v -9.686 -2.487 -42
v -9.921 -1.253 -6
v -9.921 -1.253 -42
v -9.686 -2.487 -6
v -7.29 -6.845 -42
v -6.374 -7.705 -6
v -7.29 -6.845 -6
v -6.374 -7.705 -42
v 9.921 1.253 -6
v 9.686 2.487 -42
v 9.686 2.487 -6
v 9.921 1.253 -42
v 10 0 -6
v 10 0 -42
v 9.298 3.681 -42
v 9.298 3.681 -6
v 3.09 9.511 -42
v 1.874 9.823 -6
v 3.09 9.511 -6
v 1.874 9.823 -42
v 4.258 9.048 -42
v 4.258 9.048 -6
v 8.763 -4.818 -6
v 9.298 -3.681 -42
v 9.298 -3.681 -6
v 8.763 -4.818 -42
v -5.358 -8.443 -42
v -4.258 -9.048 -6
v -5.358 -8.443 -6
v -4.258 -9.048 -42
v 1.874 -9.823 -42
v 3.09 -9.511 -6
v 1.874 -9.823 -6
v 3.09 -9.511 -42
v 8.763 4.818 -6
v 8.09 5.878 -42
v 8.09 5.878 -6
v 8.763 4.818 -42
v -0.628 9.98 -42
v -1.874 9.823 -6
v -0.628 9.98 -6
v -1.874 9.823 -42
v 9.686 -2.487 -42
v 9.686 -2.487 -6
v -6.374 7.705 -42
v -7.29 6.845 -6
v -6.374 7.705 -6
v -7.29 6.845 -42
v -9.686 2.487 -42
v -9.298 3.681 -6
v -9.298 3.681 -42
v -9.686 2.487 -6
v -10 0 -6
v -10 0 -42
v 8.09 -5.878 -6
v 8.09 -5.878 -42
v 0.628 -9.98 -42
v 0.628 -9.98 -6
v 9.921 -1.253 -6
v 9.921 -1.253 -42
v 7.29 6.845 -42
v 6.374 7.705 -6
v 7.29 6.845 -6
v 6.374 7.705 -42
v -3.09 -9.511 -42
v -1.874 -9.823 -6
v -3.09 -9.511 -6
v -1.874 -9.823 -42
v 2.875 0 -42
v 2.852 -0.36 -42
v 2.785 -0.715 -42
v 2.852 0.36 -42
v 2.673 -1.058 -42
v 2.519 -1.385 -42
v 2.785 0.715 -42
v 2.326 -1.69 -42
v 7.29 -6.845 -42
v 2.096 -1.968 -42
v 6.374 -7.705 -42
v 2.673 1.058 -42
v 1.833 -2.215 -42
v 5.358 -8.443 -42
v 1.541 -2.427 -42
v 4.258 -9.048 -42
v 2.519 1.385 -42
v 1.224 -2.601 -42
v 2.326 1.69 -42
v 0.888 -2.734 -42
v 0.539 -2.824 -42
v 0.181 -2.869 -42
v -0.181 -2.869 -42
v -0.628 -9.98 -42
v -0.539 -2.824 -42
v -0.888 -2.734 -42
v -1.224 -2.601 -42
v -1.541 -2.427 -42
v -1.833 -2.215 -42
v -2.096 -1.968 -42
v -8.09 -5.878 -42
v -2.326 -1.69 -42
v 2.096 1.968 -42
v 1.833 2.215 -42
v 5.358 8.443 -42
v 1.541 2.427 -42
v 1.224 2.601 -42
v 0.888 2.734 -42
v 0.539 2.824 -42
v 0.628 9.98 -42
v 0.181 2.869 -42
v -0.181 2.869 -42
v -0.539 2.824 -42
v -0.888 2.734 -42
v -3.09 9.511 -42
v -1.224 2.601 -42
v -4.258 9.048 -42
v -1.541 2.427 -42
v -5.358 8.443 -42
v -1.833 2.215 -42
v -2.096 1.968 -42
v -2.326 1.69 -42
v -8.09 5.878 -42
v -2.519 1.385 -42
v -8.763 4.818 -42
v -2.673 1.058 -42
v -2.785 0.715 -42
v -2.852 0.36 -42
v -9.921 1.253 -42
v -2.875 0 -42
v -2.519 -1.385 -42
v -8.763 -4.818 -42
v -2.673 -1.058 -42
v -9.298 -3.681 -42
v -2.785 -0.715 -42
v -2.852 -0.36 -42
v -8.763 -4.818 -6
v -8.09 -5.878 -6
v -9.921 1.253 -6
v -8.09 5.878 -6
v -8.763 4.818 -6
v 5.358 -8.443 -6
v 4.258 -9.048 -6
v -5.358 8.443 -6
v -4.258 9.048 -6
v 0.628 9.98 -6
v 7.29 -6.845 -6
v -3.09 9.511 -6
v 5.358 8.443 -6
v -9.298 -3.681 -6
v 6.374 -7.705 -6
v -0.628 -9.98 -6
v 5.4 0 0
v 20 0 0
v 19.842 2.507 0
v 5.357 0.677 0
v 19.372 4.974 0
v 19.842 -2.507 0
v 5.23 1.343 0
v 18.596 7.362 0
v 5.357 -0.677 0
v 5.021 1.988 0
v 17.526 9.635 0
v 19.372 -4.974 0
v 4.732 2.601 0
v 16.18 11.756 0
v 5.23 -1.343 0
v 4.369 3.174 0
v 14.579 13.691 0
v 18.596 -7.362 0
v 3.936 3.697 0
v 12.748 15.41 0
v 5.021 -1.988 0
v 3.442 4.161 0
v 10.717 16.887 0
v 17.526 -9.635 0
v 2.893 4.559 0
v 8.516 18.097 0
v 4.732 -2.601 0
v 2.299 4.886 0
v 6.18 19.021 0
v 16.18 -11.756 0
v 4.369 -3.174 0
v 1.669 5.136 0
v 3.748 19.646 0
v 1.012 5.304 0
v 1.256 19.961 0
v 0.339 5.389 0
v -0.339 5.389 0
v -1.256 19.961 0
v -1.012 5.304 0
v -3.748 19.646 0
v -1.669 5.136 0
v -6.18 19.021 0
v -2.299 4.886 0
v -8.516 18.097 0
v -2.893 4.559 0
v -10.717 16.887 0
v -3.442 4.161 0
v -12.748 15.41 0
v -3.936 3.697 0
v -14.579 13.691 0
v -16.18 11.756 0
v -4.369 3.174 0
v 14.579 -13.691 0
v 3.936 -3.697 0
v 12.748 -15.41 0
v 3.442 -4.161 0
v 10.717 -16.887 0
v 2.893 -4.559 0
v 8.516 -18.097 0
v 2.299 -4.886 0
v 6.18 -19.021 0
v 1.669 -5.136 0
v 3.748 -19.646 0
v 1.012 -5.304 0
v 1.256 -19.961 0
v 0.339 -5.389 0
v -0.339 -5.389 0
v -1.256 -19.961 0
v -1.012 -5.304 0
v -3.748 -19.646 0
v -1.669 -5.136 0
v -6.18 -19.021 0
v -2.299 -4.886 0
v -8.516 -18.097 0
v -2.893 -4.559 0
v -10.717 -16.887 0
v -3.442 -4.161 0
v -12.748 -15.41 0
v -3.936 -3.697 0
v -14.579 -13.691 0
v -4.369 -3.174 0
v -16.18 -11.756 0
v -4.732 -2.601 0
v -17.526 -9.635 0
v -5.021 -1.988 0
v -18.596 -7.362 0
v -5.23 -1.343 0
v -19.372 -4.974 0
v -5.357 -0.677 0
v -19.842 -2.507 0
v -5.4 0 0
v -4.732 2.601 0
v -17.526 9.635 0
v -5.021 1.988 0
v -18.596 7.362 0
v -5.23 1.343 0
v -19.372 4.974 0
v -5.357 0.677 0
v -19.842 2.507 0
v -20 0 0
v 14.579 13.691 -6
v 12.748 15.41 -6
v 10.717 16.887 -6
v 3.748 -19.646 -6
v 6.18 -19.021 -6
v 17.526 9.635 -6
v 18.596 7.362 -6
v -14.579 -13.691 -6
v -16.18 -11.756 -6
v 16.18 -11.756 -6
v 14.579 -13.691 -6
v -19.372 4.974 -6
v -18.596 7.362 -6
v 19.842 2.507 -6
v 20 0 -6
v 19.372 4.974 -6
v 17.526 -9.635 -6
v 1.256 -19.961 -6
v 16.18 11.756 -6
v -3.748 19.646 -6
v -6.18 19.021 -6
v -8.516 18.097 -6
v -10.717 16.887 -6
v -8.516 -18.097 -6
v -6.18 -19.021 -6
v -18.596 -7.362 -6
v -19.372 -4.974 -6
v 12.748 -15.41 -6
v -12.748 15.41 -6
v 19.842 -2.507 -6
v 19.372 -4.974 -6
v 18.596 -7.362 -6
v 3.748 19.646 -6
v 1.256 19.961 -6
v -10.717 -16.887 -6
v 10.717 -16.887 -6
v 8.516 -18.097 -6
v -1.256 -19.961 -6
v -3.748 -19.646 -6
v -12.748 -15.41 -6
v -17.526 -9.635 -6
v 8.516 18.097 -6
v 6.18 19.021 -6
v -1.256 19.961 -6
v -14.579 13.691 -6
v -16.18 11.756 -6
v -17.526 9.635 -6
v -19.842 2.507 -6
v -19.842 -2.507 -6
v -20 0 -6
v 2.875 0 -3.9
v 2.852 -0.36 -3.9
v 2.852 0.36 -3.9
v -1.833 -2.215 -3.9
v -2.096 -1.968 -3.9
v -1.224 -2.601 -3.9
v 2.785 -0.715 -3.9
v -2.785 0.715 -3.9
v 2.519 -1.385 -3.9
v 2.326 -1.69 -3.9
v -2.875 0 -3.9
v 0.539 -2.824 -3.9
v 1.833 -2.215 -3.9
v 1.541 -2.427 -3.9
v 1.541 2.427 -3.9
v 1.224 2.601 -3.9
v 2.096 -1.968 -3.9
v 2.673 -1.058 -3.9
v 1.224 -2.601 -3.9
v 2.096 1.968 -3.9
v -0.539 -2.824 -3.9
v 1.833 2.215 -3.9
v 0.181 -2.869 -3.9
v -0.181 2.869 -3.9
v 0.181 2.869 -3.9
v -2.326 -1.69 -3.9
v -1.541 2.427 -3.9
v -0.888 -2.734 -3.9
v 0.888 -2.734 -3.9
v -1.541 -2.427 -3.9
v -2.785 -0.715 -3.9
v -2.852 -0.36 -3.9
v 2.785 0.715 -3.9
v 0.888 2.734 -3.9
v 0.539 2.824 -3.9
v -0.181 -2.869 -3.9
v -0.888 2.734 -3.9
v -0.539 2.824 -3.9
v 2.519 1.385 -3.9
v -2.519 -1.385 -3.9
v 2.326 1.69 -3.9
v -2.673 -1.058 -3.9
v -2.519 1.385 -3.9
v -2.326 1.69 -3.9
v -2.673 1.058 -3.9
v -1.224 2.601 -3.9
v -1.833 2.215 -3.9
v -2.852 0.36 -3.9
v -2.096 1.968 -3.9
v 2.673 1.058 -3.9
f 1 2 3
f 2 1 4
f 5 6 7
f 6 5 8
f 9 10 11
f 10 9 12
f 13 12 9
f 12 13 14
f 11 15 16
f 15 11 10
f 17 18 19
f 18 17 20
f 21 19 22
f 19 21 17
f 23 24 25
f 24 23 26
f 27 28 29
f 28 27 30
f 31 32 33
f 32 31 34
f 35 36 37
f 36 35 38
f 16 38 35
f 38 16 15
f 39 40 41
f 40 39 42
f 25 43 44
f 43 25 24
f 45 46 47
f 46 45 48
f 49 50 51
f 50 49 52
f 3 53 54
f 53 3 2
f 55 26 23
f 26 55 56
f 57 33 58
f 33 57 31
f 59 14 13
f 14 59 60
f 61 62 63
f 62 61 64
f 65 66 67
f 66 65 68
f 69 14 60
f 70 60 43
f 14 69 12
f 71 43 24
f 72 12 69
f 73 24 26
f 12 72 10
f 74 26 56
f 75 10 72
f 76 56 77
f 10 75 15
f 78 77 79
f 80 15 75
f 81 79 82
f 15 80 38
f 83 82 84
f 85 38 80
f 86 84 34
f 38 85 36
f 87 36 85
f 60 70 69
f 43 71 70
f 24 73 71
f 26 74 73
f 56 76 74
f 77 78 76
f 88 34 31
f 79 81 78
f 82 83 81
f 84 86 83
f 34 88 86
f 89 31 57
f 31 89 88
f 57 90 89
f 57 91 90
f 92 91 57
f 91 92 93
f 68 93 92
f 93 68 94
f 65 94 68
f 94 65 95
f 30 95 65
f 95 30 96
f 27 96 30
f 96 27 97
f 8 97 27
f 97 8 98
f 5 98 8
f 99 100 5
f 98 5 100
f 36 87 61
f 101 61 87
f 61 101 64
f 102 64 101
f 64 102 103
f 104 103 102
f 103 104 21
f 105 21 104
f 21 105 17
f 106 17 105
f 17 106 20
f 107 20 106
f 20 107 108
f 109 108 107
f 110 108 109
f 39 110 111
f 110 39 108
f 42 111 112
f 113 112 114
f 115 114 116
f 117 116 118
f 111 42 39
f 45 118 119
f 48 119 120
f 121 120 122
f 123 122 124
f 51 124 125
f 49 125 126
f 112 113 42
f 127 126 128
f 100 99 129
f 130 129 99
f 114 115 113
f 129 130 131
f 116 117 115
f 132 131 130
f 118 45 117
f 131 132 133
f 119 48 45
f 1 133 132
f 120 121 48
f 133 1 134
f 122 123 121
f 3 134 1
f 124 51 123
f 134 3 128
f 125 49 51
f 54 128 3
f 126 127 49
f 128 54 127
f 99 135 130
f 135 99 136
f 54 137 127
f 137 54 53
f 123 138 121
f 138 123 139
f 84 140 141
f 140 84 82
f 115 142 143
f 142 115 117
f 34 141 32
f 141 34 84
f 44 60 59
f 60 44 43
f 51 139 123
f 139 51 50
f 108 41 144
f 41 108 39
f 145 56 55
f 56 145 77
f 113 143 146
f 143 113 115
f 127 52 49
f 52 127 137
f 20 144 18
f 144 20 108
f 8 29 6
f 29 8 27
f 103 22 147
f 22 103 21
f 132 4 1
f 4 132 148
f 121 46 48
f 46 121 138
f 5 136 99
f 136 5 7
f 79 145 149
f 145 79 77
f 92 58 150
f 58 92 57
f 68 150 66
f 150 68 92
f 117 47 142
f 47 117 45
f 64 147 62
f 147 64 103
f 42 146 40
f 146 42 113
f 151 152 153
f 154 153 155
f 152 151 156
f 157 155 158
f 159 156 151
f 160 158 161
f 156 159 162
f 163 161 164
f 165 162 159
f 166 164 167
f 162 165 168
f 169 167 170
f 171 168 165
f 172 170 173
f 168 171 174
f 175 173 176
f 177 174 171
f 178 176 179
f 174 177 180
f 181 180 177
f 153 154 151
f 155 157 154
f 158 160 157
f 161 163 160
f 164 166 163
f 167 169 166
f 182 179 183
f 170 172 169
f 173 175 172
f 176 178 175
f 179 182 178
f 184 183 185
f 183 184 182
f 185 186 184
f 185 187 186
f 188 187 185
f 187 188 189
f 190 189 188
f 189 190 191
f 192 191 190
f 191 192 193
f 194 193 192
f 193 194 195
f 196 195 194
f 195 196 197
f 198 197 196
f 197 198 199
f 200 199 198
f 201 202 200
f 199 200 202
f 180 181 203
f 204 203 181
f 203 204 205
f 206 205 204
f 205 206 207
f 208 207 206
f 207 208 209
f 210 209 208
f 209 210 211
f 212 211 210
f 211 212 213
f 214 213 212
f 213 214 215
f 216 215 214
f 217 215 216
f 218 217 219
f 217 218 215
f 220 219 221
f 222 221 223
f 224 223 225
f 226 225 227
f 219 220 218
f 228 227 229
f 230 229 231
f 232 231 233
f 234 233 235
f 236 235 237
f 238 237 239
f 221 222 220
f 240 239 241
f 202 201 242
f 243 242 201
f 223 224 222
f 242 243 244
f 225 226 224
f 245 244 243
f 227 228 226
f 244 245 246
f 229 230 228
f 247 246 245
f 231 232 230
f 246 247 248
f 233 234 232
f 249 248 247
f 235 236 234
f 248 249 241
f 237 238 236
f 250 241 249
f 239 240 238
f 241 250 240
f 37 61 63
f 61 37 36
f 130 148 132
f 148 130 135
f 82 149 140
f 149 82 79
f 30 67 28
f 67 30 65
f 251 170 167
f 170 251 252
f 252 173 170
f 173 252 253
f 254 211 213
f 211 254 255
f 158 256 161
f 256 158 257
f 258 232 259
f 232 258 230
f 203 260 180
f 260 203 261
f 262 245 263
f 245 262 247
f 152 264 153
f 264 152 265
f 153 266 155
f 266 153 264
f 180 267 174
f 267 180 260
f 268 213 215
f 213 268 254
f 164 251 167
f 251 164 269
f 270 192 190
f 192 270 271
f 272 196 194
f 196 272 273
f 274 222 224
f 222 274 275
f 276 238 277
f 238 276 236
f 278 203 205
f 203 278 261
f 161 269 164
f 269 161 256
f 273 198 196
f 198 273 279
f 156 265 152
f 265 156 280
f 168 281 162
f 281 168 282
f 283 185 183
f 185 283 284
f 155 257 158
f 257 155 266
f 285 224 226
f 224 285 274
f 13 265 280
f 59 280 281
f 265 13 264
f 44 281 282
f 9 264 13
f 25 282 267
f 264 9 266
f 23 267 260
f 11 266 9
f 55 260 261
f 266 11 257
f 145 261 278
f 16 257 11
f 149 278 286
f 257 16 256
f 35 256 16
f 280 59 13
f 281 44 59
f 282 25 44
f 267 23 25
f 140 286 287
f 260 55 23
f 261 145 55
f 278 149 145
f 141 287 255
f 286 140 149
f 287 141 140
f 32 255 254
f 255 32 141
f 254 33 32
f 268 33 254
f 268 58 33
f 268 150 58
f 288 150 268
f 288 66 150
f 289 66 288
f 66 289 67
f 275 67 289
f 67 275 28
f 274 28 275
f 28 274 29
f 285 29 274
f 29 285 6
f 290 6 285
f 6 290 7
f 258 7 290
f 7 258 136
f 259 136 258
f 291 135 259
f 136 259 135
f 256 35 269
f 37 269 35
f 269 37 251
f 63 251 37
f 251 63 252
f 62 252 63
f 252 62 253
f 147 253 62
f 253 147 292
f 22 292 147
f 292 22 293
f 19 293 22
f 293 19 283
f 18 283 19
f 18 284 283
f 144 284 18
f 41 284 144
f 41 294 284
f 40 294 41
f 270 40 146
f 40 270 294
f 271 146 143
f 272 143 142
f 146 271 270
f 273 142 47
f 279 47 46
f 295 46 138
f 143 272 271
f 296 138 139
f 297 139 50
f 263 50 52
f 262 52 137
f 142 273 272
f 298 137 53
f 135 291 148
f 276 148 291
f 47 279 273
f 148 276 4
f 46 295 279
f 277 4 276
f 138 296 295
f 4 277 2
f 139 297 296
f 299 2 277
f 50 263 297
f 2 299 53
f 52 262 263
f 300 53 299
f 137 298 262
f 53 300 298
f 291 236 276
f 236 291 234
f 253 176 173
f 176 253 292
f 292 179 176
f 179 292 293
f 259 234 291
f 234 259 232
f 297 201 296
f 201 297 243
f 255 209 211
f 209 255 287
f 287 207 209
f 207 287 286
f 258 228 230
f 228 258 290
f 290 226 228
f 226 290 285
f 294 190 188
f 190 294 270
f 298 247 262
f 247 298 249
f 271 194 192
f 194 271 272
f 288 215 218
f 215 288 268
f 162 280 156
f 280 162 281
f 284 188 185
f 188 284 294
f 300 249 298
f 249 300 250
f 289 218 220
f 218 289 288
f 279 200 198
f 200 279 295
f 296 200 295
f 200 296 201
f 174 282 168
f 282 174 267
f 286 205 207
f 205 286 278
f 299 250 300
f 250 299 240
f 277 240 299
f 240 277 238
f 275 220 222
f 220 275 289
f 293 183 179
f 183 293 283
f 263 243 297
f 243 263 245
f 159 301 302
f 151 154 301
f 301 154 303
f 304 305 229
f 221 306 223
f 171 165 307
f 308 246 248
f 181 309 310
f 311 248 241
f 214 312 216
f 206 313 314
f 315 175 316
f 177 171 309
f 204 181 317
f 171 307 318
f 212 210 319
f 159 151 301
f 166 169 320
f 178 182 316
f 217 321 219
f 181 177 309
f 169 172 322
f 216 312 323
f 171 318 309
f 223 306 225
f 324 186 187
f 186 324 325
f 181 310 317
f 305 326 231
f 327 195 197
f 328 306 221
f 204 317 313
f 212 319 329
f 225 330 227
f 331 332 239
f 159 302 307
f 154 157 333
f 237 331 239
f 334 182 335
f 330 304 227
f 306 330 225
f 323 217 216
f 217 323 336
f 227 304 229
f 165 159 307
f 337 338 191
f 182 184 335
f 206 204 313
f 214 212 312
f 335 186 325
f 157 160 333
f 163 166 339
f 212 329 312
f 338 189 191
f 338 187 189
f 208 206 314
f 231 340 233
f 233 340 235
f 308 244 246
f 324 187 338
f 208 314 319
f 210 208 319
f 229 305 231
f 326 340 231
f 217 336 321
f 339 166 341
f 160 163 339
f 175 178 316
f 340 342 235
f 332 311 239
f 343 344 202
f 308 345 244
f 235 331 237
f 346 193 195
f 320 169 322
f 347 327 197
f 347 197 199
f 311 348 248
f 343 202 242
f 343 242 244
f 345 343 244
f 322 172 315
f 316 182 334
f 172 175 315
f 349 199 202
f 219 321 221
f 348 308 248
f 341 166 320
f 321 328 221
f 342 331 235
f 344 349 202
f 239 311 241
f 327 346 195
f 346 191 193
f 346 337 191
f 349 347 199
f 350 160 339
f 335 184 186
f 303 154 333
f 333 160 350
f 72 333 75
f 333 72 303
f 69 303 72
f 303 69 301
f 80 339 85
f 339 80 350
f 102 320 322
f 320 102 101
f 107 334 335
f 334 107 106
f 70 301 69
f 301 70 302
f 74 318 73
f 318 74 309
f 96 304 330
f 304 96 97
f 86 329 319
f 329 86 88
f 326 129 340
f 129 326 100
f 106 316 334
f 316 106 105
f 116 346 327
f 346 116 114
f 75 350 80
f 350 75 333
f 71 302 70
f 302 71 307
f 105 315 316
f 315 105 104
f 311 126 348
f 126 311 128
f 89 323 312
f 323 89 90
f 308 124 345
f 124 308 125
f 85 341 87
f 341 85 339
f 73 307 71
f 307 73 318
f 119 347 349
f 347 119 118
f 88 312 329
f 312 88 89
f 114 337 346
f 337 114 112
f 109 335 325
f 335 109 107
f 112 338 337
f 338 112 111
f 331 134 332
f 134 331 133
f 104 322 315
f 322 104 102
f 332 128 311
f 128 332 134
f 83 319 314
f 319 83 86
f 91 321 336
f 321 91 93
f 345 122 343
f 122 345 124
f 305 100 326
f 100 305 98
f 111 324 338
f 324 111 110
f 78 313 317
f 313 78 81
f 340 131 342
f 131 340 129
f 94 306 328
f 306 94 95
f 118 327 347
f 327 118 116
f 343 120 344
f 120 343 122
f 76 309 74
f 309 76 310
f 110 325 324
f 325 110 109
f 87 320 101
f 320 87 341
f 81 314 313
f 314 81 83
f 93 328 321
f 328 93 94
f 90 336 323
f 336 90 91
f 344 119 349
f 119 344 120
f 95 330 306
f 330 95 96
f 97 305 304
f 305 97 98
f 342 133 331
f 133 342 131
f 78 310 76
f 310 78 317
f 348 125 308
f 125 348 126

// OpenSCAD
$fn = 50;


difference() {
	union() {
		translate(v = [0, 0, -42.0000000000]) {
			cylinder(h = 42, r = 10.0000000000);
		}
		translate(v = [0, 0, -6.0000000000]) {
			cylinder(h = 6, r = 20.0000000000);
		}
	}
	union() {
		translate(v = [0, 0, 0]) {
			rotate(a = [0, 0, 0]) {
				difference() {
					union() {
						#translate(v = [0, 0, -42.0000000000]) {
							cylinder(h = 42, r = 2.6000000000);
						}
						#translate(v = [0, 0, -3.9000000000]) {
							cylinder(h = 3.9000000000, r1 = 2.8750000000, r2 = 5.4000000000);
						}
						#translate(v = [0, 0, -42.0000000000]) {
							cylinder(h = 42, r = 2.8750000000);
						}
						#translate(v = [0, 0, -42.0000000000]) {
							cylinder(h = 42, r = 2.6000000000);
						}
					}
					union();
				}
			}
		}
	}
}
